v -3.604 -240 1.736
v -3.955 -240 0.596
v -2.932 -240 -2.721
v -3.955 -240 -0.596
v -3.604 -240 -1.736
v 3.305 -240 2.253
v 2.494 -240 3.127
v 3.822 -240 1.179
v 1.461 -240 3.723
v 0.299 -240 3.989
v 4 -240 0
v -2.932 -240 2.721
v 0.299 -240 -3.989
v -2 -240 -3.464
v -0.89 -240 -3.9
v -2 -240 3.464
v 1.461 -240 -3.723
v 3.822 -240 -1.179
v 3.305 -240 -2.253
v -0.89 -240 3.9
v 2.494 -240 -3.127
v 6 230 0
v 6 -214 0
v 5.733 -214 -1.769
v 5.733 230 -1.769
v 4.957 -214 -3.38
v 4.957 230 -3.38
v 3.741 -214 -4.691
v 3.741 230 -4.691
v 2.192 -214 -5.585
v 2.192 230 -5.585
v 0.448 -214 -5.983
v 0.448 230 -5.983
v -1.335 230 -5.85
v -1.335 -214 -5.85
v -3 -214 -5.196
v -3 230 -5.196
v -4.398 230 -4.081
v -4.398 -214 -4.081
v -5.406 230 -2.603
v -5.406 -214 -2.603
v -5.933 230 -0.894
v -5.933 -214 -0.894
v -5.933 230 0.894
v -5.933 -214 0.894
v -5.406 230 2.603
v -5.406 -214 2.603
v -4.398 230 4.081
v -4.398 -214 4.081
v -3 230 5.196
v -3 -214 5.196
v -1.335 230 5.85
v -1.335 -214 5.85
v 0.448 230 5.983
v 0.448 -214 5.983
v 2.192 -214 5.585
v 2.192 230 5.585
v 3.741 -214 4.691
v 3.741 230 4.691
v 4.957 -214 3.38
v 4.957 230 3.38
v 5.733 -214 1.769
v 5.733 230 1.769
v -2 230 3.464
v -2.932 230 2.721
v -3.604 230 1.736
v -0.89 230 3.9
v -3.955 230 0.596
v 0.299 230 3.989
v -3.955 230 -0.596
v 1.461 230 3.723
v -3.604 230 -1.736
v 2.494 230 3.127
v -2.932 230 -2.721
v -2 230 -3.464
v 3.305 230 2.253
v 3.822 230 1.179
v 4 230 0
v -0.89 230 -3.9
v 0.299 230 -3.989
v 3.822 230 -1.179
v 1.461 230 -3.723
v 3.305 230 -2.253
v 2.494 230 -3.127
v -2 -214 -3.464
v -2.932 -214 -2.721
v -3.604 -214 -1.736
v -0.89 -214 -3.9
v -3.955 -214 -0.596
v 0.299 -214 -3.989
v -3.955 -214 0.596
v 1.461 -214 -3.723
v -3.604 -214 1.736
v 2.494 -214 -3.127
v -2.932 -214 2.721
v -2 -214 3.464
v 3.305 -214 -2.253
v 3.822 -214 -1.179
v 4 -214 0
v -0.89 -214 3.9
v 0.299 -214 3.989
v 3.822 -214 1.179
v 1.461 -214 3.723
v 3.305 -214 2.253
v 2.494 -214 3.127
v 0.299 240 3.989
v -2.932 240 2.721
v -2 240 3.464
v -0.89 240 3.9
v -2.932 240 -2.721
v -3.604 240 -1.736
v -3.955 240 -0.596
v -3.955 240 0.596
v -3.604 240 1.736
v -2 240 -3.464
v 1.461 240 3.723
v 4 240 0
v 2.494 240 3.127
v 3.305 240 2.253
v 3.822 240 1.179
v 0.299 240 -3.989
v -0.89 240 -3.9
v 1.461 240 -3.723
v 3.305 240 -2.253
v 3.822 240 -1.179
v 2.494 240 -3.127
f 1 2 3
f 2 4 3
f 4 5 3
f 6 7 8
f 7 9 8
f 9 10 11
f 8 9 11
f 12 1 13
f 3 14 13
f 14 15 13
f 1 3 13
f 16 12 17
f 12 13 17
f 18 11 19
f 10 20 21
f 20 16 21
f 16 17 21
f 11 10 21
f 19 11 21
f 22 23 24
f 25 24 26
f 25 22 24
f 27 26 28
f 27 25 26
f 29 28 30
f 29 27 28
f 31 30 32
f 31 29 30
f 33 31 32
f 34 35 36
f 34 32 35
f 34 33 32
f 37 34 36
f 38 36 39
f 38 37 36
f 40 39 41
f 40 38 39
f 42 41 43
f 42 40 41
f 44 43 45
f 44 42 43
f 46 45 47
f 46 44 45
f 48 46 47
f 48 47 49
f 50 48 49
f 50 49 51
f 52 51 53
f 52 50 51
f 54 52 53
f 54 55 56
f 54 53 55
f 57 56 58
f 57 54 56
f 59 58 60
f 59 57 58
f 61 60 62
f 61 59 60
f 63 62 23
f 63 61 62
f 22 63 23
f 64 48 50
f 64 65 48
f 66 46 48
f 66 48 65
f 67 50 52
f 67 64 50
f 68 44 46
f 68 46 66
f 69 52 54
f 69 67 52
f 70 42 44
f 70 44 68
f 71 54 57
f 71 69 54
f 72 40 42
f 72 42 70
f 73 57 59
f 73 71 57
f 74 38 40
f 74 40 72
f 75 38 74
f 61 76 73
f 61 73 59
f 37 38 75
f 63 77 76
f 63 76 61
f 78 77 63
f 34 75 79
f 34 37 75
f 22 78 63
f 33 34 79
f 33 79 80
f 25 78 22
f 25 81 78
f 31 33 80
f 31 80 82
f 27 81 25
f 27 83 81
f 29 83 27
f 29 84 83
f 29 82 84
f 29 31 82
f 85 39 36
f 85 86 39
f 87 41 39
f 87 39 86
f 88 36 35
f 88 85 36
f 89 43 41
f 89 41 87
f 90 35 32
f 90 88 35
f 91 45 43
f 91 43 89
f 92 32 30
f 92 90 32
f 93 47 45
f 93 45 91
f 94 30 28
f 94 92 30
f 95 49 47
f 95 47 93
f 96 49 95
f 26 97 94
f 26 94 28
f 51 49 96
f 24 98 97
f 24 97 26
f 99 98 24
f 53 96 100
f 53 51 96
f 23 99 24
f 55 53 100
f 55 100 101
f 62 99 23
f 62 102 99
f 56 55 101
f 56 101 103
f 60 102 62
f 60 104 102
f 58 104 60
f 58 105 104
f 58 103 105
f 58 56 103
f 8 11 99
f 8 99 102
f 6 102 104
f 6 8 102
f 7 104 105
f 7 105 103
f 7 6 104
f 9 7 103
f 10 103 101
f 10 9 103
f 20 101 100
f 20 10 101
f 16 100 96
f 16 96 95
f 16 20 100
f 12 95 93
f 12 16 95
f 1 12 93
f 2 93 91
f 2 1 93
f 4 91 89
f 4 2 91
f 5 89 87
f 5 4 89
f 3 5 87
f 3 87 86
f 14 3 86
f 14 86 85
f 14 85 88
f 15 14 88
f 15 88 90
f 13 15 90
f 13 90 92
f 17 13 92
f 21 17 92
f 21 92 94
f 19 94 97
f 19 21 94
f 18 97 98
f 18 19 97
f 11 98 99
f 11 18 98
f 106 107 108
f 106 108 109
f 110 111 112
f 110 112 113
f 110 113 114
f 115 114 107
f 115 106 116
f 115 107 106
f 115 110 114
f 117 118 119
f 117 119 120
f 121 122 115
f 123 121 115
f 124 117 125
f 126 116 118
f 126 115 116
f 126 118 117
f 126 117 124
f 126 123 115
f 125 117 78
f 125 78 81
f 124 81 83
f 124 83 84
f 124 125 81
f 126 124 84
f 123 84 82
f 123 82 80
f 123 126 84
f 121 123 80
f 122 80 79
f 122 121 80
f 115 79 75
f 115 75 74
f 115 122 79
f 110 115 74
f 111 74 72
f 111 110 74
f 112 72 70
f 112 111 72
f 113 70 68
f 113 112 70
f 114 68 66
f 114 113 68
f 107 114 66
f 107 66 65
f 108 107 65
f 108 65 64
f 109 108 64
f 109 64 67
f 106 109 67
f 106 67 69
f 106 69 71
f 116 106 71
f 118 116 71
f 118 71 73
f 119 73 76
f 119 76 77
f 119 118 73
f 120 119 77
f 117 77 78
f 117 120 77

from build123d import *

# Parameters (mm, degrees)
SKETCH1_R           = 6
BOSS_EXTRUDE1_DEPTH = 240
SKETCH2_R           = 6
SKETCH2_R_2         = 4
CUT_EXTRUDE1_DEPTH  = 10
SKETCH3_R           = 6
SKETCH3_R_2         = 4
CUT_EXTRUDE2_DEPTH  = 25.999999878


with BuildPart() as part:
    # Sketch1 → Boss-Extrude1 (new body, symmetric)
    with BuildSketch(Plane(origin=(0, 0, 0), x_dir=(1, 0, 0), z_dir=(0, 1, 0))):
        Circle(SKETCH1_R)
    extrude(amount=BOSS_EXTRUDE1_DEPTH, both=True)

    # Sketch2 → Cut-Extrude1 (cut)
    with BuildSketch(Plane(origin=(0, 240, 0), x_dir=(1, 0, 0), z_dir=(0, 1, 0))):
        Circle(SKETCH2_R)
        Circle(SKETCH2_R_2, mode=Mode.SUBTRACT)
    extrude(amount=-CUT_EXTRUDE1_DEPTH, mode=Mode.SUBTRACT)

    # Sketch3 → Cut-Extrude2 (cut)
    with BuildSketch(Plane.XZ.offset(240)):
        Circle(SKETCH3_R)
        Circle(SKETCH3_R_2, mode=Mode.SUBTRACT)
    extrude(amount=-CUT_EXTRUDE2_DEPTH, mode=Mode.SUBTRACT)


solid = part.part
